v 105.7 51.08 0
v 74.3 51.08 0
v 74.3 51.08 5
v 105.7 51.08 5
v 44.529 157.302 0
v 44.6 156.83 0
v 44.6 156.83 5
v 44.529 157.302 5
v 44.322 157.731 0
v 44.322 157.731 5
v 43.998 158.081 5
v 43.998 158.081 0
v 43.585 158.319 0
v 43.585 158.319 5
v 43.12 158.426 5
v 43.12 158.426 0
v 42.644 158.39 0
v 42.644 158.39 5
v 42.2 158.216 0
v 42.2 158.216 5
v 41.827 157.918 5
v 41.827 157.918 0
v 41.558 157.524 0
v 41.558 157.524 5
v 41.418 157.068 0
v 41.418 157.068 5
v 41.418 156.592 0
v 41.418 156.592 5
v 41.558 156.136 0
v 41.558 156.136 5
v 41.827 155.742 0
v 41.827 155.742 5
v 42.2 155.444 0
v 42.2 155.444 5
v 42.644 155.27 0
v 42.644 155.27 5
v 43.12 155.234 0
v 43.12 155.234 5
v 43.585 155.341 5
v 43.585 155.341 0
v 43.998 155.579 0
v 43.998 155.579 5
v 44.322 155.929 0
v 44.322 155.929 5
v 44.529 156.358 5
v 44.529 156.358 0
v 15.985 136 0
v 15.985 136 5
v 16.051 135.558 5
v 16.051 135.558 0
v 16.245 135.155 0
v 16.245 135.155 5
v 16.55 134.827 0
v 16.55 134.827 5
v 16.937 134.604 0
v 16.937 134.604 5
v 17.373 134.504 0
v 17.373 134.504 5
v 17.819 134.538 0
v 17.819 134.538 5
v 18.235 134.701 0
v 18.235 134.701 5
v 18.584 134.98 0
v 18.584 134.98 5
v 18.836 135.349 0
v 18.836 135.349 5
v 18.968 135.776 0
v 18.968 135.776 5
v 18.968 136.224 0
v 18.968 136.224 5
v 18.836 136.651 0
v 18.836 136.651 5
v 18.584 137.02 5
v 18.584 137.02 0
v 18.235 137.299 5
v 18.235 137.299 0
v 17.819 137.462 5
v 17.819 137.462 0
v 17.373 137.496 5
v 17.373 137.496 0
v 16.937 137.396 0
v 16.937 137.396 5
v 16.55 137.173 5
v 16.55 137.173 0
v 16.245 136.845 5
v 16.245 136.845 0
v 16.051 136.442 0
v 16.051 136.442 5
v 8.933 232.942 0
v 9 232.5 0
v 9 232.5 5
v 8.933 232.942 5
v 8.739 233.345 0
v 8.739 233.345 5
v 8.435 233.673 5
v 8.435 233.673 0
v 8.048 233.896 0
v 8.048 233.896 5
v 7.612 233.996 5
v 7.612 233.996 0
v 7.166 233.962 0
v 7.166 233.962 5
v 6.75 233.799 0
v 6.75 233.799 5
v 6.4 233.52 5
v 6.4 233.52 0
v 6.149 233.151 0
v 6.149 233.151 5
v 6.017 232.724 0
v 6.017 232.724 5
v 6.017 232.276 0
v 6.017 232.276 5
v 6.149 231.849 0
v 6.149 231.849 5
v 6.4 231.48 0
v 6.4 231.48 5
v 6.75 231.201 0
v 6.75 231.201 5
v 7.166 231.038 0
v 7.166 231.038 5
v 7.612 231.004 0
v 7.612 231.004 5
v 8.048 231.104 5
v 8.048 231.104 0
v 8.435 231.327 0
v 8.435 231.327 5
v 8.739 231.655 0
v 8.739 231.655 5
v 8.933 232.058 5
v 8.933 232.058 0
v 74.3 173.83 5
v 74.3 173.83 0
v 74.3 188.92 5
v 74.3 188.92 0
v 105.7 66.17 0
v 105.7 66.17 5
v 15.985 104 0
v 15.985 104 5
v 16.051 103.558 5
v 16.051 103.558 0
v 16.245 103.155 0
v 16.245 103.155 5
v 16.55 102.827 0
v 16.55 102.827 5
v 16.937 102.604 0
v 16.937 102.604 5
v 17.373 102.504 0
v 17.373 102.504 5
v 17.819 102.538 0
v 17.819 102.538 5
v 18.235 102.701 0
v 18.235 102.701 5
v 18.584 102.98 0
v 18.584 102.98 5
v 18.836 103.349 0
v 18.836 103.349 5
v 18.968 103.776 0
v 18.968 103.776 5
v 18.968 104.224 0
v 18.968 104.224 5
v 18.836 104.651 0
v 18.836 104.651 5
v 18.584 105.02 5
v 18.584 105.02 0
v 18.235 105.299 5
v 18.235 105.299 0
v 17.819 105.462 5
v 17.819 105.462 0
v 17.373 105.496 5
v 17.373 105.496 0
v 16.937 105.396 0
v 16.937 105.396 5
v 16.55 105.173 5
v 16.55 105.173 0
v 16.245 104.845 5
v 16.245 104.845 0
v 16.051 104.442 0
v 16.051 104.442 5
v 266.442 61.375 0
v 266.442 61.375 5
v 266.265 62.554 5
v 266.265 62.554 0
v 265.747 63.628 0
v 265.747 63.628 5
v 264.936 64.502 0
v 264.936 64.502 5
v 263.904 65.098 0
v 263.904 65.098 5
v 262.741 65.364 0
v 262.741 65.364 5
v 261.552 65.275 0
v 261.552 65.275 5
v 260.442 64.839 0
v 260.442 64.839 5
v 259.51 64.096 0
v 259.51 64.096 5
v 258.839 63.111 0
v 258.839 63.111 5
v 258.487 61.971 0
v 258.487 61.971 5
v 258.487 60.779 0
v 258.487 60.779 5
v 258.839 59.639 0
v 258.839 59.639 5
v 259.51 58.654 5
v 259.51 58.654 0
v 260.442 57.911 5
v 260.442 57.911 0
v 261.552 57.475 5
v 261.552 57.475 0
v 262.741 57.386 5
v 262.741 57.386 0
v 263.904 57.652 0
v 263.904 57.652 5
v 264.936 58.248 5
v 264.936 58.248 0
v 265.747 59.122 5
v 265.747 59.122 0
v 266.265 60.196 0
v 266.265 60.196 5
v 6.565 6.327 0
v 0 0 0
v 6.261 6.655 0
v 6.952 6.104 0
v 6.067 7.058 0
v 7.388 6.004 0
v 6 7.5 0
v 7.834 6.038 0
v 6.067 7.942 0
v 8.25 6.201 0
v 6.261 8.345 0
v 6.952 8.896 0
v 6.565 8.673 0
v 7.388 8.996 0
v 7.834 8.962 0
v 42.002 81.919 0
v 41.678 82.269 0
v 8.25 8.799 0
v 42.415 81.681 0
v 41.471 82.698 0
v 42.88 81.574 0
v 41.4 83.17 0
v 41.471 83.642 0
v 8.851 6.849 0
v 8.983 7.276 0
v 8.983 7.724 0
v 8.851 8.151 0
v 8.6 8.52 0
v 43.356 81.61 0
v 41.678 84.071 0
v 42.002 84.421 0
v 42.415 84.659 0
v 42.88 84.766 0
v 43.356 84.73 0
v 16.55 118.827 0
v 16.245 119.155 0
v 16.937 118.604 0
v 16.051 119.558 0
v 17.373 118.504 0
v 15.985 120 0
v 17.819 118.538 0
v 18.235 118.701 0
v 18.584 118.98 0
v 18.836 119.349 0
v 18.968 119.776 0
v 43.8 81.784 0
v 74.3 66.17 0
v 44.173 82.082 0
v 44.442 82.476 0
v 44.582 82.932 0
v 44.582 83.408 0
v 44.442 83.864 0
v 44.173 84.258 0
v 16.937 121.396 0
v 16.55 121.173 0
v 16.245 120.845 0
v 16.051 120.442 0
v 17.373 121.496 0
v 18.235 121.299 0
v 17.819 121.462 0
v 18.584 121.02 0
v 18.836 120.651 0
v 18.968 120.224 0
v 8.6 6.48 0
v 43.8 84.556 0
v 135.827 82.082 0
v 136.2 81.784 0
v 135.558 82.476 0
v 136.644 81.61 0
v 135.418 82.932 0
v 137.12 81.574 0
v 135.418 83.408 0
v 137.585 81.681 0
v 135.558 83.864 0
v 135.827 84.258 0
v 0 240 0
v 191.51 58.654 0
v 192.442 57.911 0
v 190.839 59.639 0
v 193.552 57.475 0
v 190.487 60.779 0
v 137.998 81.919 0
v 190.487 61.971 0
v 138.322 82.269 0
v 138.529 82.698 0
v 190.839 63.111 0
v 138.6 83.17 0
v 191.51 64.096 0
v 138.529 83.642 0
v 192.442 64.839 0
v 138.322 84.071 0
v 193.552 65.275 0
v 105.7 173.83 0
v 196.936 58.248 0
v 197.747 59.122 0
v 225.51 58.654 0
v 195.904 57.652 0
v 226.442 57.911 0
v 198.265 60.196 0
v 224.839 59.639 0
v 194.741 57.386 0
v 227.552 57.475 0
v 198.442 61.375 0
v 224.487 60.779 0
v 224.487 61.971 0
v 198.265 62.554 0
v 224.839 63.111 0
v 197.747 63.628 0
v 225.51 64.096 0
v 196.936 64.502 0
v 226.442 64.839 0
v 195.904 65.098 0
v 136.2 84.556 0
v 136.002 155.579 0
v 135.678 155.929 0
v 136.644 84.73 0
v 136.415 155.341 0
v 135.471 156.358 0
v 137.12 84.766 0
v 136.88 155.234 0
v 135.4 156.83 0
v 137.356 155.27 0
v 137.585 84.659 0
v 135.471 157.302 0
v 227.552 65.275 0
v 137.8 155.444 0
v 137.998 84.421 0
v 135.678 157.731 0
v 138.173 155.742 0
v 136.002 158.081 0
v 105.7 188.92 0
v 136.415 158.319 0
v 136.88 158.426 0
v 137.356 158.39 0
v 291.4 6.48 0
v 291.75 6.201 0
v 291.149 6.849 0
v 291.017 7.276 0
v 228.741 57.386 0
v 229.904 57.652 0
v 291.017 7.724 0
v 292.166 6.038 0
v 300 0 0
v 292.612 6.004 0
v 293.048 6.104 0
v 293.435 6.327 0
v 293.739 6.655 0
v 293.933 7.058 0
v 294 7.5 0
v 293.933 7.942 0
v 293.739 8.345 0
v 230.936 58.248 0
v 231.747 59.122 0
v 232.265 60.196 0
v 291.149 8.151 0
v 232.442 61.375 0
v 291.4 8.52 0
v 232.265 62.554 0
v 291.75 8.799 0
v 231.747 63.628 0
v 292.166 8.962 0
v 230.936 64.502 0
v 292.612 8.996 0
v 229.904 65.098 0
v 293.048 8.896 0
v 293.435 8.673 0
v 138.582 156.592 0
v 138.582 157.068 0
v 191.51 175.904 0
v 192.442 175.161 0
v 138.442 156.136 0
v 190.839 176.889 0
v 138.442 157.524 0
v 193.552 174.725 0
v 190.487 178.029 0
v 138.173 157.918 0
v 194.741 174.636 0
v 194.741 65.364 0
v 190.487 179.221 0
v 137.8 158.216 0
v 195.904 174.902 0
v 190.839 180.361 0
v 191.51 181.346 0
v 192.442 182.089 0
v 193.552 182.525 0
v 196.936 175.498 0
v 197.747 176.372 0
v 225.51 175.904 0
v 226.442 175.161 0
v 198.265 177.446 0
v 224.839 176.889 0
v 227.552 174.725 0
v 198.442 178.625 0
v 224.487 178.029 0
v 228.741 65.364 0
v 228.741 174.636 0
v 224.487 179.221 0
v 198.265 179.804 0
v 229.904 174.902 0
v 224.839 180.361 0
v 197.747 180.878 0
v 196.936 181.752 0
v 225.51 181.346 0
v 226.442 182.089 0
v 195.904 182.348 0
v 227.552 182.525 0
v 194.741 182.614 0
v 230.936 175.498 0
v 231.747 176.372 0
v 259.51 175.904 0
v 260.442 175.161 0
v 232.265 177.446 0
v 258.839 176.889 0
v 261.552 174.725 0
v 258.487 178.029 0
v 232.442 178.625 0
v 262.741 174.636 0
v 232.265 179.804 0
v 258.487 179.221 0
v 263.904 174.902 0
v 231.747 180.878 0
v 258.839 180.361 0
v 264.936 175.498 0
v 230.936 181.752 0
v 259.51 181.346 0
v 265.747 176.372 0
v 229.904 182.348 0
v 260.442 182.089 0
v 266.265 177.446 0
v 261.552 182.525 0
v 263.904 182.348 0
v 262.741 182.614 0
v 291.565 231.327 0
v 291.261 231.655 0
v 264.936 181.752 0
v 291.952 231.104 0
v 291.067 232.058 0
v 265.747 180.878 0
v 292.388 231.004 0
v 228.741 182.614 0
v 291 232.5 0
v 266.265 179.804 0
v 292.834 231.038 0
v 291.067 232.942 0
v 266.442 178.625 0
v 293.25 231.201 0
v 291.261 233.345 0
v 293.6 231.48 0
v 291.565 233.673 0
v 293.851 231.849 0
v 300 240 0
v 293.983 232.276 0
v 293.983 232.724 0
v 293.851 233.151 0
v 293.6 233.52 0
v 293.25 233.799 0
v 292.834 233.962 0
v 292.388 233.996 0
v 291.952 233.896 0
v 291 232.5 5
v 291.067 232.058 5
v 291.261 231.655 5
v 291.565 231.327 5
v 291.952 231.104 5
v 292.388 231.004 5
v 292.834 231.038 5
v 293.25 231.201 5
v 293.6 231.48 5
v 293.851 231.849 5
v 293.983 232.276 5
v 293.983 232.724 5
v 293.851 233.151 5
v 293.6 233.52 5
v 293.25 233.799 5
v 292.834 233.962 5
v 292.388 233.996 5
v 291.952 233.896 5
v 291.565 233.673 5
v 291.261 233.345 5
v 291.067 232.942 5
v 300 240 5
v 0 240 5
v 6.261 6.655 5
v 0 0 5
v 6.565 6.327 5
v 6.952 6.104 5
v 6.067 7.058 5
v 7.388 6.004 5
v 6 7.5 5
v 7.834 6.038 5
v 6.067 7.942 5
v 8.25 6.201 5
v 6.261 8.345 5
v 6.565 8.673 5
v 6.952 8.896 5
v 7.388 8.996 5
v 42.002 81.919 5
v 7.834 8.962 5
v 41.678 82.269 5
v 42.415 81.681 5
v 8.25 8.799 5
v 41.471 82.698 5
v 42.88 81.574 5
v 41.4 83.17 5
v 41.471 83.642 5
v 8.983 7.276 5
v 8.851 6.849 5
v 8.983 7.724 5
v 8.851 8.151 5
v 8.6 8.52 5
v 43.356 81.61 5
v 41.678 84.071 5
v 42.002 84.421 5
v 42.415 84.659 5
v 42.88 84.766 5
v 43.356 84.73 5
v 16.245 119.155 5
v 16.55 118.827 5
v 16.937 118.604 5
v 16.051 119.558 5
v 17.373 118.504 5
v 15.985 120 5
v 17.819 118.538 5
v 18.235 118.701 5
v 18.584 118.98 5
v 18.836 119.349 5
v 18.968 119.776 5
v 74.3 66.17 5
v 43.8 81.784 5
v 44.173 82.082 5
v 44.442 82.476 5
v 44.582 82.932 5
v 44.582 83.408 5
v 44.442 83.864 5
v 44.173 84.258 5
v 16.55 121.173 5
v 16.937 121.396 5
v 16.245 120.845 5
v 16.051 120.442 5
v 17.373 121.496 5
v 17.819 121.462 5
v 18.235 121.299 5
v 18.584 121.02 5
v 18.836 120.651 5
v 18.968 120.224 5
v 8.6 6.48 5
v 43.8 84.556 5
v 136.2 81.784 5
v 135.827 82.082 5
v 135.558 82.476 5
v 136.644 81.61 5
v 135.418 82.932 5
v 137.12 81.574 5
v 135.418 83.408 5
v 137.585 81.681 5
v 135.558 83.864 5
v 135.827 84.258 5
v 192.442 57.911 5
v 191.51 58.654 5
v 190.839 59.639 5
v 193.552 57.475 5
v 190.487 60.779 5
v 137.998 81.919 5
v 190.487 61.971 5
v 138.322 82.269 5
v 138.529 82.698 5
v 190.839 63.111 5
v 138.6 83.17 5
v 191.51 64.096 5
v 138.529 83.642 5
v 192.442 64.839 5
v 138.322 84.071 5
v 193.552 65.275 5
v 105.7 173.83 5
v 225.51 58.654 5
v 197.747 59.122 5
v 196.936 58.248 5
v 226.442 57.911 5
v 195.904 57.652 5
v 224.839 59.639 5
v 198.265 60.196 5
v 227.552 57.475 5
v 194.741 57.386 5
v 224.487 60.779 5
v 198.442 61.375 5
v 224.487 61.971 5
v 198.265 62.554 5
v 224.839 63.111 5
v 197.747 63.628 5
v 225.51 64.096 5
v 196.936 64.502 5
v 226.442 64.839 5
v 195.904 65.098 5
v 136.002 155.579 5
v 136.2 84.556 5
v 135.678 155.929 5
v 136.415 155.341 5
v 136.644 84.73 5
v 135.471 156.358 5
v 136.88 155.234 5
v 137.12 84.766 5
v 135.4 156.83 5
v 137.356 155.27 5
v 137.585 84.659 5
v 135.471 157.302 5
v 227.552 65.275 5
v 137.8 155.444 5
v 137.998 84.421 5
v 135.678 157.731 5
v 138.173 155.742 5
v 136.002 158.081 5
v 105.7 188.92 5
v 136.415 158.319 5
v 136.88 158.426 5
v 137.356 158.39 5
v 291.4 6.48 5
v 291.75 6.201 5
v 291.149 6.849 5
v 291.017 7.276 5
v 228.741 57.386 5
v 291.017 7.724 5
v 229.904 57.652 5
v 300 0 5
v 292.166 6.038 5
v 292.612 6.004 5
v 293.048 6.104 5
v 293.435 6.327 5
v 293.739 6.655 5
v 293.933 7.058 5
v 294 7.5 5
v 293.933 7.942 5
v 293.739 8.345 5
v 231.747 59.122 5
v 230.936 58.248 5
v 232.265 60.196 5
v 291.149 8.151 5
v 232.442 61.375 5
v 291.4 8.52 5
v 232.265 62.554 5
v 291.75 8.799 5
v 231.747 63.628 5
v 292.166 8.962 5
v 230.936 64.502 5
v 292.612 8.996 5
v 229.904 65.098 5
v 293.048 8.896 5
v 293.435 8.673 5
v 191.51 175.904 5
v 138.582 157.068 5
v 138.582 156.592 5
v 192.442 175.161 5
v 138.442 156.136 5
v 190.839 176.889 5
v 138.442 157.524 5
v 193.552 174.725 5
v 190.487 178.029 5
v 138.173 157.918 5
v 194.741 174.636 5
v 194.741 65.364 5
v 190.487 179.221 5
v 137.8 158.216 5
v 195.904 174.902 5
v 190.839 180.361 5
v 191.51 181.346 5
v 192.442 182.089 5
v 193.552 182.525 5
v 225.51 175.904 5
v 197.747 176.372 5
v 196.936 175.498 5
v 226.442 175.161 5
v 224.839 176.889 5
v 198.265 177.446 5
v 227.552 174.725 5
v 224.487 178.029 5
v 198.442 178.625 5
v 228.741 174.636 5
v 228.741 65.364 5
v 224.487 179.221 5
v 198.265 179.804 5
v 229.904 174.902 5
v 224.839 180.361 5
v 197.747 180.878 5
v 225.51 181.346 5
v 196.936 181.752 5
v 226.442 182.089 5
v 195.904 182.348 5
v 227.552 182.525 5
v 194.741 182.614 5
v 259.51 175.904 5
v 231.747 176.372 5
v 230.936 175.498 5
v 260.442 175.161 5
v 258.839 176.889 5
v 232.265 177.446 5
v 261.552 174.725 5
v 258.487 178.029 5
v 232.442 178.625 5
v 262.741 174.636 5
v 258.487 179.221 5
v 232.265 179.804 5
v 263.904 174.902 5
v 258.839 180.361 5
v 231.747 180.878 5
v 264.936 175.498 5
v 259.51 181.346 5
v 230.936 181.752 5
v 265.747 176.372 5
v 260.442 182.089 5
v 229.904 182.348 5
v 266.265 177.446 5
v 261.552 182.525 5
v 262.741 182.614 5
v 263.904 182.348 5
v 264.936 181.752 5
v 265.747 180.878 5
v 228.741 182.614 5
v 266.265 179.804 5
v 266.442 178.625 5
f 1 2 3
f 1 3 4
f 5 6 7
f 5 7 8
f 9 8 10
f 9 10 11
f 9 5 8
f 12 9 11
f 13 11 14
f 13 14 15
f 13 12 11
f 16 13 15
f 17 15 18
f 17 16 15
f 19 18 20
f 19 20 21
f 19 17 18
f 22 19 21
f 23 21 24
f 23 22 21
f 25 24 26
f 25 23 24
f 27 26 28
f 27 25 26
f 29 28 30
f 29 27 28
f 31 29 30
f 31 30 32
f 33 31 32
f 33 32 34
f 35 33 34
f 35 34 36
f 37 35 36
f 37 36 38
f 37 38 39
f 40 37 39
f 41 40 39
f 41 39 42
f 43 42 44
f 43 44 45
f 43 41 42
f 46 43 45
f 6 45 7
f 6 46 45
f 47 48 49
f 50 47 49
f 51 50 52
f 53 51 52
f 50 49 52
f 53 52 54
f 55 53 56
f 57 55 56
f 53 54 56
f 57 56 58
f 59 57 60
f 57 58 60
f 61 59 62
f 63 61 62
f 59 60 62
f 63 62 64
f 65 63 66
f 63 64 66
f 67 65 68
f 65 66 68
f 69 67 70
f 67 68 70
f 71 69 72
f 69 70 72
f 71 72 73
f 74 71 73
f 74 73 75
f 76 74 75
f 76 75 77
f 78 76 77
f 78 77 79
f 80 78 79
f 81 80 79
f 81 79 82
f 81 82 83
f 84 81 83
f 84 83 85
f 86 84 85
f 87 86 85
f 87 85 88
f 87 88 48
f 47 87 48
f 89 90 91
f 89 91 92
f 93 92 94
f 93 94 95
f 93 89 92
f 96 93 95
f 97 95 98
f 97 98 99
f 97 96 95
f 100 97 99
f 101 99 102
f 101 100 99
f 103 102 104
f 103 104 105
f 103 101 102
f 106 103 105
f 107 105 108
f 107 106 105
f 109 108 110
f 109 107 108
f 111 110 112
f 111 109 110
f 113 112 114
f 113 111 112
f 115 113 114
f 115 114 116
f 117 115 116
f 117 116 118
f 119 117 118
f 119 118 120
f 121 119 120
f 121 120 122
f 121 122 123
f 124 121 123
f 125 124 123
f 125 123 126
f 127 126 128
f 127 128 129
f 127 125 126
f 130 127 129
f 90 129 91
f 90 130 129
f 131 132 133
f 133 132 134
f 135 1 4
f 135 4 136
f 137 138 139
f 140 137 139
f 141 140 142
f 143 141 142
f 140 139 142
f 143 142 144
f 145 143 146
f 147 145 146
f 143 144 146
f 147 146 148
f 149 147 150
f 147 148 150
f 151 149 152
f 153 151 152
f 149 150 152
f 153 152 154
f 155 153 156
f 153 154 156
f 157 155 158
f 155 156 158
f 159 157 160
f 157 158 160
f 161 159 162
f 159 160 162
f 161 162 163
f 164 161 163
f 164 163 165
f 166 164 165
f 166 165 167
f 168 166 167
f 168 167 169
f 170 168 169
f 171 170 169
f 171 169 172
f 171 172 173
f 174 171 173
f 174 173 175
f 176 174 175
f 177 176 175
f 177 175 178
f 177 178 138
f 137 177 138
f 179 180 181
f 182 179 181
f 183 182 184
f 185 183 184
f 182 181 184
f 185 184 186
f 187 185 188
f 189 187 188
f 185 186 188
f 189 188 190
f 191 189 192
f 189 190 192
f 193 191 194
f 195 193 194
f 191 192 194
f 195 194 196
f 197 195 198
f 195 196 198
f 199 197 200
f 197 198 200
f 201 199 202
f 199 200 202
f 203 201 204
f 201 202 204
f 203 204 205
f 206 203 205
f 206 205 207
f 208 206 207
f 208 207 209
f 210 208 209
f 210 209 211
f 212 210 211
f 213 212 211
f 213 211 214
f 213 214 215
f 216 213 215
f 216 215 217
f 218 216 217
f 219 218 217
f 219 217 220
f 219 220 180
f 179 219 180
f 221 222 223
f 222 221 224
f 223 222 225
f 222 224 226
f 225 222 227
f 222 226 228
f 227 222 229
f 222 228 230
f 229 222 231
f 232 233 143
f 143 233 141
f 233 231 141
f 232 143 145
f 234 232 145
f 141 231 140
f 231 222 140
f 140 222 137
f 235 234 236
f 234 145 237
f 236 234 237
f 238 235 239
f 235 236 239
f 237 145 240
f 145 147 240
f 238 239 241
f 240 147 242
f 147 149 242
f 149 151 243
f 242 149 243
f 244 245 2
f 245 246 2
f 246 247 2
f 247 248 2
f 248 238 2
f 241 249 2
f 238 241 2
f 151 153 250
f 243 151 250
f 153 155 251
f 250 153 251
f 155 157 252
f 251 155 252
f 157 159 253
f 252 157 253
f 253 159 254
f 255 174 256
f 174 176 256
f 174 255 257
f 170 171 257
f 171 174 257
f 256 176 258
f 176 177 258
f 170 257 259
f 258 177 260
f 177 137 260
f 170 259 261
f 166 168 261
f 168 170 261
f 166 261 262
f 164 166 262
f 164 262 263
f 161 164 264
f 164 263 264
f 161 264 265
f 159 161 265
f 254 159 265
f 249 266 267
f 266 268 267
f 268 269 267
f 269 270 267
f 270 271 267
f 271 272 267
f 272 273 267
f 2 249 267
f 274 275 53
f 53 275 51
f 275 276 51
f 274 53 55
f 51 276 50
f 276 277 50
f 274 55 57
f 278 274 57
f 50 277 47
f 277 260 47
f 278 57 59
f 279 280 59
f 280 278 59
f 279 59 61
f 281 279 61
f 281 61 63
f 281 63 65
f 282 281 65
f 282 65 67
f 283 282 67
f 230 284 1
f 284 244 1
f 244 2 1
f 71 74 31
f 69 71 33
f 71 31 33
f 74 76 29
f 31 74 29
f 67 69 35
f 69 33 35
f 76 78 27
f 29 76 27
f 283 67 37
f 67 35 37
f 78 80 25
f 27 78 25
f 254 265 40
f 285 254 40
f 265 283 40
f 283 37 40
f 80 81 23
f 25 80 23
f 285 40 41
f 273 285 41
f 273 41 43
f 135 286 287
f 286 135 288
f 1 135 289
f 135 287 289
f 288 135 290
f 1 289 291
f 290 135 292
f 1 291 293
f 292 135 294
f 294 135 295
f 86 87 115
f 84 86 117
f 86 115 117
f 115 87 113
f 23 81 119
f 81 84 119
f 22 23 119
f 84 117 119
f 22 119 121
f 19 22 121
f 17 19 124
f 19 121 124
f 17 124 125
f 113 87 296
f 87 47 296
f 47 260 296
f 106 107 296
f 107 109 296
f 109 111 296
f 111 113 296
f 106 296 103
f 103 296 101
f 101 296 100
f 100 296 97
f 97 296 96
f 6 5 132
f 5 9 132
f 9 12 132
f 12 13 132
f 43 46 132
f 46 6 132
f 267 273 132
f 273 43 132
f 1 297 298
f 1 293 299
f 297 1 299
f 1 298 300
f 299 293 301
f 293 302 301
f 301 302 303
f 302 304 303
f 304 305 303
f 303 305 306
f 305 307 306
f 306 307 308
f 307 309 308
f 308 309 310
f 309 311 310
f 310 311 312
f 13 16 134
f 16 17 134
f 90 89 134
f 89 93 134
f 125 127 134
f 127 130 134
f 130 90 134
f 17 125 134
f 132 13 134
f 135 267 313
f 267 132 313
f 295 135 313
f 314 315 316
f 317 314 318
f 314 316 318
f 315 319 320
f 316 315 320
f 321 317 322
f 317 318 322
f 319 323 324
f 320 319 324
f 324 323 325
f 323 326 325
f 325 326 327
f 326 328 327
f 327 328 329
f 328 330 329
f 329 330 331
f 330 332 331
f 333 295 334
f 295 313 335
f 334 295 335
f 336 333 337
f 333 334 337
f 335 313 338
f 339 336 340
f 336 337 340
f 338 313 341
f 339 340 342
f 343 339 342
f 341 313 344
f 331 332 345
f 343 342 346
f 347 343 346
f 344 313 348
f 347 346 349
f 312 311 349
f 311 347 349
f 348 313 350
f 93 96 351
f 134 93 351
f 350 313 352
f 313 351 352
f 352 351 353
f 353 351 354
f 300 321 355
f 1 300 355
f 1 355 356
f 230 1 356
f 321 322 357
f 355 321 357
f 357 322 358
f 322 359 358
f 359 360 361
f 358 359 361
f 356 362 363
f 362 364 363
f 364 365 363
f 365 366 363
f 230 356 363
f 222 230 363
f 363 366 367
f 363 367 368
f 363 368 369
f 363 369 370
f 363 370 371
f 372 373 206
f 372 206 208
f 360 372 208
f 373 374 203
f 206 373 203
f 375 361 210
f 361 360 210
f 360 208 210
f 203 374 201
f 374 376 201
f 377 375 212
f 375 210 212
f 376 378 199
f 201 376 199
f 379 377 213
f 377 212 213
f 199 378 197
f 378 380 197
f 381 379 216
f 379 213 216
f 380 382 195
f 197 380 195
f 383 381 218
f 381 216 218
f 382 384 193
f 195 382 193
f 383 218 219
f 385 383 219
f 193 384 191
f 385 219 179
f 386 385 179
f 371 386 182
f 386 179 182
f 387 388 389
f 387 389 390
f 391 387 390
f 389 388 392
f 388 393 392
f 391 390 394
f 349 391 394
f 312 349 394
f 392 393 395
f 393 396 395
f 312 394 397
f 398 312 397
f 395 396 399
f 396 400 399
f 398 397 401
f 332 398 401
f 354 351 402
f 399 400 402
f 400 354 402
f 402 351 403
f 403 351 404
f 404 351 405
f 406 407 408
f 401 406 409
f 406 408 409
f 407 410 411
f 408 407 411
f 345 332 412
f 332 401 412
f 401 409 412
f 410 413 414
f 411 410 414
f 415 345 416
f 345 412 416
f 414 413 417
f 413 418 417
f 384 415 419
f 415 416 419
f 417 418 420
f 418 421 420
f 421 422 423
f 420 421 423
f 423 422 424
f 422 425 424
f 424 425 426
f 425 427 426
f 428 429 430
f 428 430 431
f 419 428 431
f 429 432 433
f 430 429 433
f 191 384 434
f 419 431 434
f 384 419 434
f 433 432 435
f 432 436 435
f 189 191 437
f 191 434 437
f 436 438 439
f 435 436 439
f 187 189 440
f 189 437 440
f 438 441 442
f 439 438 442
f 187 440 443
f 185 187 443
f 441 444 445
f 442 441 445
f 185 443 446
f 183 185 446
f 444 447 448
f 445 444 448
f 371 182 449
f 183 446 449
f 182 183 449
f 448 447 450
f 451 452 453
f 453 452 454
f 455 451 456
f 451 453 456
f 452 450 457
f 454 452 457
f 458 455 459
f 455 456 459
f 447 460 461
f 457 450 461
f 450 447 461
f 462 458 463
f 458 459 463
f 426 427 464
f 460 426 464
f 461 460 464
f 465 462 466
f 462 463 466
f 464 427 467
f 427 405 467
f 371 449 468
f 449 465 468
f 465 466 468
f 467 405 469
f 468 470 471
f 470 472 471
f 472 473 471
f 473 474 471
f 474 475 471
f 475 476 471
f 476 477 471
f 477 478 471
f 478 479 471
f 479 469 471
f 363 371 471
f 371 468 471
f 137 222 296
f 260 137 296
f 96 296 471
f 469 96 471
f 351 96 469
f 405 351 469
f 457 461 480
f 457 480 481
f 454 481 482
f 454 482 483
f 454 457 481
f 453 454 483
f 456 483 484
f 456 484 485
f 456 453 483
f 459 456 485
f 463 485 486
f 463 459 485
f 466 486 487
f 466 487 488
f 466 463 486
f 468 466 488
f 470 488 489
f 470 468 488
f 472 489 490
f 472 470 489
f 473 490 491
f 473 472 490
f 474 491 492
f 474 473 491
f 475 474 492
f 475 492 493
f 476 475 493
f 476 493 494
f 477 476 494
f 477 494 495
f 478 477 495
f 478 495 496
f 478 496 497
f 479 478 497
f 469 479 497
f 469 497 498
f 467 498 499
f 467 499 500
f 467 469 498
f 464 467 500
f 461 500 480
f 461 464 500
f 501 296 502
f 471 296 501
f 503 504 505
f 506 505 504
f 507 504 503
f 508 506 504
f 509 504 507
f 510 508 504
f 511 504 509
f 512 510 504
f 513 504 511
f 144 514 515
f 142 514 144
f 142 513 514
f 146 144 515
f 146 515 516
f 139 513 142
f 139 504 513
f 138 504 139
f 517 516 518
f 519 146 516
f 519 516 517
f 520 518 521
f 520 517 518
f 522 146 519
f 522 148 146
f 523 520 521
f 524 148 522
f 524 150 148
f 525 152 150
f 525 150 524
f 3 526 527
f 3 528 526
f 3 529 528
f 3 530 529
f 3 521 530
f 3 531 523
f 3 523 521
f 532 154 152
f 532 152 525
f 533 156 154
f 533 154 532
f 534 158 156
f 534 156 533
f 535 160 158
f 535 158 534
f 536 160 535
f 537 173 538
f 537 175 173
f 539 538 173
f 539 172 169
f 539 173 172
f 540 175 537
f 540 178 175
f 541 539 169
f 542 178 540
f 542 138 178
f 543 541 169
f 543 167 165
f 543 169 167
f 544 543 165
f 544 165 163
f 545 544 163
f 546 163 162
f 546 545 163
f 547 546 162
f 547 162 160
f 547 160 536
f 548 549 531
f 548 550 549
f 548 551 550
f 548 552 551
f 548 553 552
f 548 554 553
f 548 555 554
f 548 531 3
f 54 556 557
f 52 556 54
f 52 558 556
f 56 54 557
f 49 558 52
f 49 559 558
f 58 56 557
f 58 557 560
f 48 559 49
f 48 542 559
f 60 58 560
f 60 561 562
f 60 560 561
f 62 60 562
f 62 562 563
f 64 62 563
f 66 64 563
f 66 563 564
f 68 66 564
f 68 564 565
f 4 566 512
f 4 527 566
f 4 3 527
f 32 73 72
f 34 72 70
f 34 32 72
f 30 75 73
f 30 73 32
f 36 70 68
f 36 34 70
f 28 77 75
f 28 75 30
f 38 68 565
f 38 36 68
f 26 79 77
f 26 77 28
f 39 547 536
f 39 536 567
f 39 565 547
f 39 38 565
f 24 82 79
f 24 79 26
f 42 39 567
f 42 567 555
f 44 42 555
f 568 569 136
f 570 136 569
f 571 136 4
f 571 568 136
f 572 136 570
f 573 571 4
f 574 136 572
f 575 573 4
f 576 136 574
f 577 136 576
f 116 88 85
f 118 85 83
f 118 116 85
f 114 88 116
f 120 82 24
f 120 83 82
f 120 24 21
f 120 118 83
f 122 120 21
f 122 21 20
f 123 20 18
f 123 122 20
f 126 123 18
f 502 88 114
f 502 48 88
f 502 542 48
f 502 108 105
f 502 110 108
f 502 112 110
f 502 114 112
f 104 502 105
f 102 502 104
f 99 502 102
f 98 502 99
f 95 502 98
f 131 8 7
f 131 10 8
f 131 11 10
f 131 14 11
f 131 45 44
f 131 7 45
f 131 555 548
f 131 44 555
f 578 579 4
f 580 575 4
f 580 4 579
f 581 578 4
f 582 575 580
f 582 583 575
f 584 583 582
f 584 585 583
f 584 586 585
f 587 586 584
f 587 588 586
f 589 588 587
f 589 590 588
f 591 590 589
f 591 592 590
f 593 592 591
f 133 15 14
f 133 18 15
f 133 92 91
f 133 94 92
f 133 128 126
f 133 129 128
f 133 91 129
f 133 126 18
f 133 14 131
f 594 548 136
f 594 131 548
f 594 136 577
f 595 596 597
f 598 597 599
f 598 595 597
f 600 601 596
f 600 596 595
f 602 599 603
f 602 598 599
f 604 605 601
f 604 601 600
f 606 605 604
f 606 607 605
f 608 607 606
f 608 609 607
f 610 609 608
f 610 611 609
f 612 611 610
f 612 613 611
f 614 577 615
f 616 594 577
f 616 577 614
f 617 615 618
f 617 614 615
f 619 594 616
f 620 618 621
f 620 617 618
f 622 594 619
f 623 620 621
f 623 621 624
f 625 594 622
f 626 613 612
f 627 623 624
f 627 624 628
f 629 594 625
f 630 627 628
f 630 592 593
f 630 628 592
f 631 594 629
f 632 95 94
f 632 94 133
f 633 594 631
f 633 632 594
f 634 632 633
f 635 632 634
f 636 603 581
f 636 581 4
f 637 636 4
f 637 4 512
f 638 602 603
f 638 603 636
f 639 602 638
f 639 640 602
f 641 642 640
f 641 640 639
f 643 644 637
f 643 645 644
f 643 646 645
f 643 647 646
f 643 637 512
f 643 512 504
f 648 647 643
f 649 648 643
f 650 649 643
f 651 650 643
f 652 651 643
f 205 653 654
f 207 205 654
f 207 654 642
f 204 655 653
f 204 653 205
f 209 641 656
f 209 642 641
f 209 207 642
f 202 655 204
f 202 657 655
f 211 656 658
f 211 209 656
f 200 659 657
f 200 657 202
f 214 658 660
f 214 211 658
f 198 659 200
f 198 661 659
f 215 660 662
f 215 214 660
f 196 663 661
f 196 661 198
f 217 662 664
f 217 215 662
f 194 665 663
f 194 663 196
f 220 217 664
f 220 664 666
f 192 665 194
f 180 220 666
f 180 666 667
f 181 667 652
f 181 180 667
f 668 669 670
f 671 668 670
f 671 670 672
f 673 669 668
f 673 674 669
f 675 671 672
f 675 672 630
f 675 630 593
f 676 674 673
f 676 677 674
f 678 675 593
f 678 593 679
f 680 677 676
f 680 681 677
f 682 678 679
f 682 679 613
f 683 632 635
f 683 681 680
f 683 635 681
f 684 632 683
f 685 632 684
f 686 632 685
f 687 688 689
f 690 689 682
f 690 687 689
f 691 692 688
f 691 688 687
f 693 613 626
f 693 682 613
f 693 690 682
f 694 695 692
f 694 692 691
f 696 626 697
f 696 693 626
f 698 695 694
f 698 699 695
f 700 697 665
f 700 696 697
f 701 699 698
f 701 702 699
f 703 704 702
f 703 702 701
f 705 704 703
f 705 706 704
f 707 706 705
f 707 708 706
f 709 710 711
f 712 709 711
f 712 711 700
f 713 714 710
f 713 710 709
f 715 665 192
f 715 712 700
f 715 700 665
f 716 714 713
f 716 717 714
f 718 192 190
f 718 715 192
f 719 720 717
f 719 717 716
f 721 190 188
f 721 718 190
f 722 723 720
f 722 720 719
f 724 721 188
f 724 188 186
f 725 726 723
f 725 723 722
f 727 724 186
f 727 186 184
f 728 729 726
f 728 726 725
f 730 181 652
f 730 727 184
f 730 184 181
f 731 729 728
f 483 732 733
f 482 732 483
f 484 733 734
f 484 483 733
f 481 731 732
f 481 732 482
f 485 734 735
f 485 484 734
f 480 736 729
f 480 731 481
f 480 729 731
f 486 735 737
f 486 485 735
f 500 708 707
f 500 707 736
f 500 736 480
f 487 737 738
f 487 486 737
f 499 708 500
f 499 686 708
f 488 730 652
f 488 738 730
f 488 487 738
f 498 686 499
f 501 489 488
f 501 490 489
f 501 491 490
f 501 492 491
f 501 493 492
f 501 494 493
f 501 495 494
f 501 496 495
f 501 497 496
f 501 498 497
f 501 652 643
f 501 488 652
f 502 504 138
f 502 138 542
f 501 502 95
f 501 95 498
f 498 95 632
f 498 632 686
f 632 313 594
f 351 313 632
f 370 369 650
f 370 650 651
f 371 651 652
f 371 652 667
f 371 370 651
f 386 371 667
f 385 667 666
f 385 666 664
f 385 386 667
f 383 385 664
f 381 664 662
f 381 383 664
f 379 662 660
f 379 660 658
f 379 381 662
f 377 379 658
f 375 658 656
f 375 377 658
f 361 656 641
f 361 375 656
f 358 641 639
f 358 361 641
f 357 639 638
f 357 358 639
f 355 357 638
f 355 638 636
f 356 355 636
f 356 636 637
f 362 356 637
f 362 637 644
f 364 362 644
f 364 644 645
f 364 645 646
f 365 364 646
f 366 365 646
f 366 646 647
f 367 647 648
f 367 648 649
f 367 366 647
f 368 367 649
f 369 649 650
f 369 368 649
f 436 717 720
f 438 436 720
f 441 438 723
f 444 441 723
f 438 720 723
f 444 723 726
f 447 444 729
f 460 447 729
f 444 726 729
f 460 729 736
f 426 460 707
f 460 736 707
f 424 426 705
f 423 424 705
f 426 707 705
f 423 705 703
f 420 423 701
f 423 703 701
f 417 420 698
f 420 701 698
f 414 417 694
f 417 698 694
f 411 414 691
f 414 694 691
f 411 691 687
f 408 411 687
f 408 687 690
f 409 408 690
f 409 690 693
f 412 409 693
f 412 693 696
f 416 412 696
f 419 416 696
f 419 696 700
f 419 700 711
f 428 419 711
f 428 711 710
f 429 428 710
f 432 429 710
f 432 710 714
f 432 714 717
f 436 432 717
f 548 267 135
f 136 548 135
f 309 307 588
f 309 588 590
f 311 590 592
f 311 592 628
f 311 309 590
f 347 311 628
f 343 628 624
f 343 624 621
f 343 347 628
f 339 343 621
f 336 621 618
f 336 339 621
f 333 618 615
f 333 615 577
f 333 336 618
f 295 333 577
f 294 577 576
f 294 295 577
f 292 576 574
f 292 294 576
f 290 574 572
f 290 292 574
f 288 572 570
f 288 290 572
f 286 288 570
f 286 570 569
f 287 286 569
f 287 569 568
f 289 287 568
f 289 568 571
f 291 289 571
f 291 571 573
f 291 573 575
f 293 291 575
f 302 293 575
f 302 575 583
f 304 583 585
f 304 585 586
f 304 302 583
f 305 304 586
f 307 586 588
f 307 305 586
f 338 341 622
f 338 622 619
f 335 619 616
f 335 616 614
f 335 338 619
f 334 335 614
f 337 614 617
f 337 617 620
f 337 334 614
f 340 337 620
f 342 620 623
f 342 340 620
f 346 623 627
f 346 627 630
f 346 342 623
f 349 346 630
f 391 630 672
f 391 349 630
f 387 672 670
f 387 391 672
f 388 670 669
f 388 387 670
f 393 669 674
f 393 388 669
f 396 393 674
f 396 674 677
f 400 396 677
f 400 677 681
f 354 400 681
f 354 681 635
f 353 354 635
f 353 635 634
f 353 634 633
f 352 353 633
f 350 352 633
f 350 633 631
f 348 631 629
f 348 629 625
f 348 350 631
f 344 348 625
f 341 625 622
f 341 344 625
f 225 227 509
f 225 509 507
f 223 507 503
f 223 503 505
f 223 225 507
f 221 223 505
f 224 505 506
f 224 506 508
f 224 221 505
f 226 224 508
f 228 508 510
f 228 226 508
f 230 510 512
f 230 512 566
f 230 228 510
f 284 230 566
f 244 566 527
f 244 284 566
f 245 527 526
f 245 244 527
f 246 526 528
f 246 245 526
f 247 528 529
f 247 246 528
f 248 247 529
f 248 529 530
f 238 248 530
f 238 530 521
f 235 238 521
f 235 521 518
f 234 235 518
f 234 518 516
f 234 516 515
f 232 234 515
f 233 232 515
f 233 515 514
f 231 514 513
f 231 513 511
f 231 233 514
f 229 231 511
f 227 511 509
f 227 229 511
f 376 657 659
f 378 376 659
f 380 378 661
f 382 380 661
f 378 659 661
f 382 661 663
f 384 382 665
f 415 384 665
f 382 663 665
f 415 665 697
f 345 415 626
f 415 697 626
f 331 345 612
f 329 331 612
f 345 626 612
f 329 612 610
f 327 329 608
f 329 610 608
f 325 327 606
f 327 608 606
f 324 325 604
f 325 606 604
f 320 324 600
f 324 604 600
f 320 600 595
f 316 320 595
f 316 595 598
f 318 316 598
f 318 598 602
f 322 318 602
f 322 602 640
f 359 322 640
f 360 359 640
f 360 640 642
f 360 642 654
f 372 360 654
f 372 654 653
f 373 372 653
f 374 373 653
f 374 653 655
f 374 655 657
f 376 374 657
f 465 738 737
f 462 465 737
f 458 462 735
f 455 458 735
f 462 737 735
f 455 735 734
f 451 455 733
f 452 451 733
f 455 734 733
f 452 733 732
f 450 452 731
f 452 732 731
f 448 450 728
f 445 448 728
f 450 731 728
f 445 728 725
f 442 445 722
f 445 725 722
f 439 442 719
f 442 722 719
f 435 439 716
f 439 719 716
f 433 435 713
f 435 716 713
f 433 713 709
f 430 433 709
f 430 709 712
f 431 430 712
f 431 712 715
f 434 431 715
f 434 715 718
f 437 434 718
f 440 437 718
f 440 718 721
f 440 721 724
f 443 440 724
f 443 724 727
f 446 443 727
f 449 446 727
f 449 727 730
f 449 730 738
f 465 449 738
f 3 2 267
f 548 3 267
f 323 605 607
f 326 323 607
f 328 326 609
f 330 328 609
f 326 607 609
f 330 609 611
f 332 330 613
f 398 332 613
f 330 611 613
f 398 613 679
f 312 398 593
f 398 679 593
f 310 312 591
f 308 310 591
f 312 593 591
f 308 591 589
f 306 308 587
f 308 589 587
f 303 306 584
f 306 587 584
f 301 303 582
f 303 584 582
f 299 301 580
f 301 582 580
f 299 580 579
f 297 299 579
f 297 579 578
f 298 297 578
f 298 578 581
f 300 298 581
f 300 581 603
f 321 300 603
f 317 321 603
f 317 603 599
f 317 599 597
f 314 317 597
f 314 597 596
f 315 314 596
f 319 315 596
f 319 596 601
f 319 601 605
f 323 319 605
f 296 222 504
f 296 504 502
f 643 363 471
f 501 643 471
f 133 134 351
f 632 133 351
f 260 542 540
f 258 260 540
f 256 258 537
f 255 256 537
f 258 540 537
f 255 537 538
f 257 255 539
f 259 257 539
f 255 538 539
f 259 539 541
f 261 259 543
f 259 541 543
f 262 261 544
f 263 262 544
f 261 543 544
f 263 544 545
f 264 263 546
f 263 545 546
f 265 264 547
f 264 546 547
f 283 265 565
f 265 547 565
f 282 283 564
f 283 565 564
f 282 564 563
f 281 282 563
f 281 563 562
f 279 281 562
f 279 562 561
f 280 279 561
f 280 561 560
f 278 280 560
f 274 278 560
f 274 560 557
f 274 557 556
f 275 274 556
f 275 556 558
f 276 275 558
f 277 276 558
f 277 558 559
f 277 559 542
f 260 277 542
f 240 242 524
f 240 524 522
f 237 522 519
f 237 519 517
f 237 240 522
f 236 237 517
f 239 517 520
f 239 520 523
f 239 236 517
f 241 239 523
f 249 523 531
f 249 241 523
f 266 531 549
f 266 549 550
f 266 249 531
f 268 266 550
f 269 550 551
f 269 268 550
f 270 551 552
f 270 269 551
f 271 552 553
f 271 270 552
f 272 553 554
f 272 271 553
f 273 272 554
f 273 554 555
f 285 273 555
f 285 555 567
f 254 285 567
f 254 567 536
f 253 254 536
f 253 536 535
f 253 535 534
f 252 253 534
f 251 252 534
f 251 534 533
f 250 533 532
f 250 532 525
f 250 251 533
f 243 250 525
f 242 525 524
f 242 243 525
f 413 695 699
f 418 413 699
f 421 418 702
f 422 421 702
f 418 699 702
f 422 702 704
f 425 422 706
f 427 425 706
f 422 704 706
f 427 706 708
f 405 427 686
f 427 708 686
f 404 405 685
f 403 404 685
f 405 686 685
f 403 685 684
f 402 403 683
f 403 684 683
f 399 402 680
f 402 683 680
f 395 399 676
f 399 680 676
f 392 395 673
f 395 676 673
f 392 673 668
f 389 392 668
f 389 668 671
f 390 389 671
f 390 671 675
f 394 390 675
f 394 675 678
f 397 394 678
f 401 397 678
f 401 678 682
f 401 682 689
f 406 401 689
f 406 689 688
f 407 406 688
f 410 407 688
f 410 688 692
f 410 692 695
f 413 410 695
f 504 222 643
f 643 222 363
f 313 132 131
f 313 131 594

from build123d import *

# Parameters (mm, degrees)
SKETCH1_W           = 300
SKETCH1_H           = 240
SKETCH1_R           = 1.5
SKETCH1_R_2         = 1.6
SKETCH1_W_2         = 31.4
SKETCH1_H_2         = 15.09
BOSS_EXTRUDE1_DEPTH = 5
SKETCH3_R           = 1.5
CUT_EXTRUDE1_DEPTH  = 385.219989069
SKETCH5_R           = 4
CUT_EXTRUDE3_DEPTH  = 385.219989069
SKETCH8_R           = 4
CUT_EXTRUDE4_DEPTH  = 385.219989069


with BuildPart() as part:
    # Sketch1 → Boss-Extrude1 (new body)
    with BuildSketch(Plane.XY):
        with Locations((150, 120)):
            Rectangle(SKETCH1_W, SKETCH1_H)
        with Locations((7.5, 232.5)):
            Circle(SKETCH1_R, mode=Mode.SUBTRACT)
        with Locations(Location((292.5, 232.5, 0), (0, 0, 180))):
            Circle(SKETCH1_R, mode=Mode.SUBTRACT)
        with Locations((292.5, 7.5)):
            Circle(SKETCH1_R, mode=Mode.SUBTRACT)
        with Locations(Location((7.5, 7.5, 0), (0, 0, 180))):
            Circle(SKETCH1_R, mode=Mode.SUBTRACT)
        with Locations(Location((137, 156.83, 0), (0, 0, 180))):
            Circle(SKETCH1_R_2, mode=Mode.SUBTRACT)
        with Locations((43, 156.83)):
            Circle(SKETCH1_R_2, mode=Mode.SUBTRACT)
        with Locations(Location((43, 83.17, 0), (0, 0, 180))):
            Circle(SKETCH1_R_2, mode=Mode.SUBTRACT)
        with Locations((137, 83.17)):
            Circle(SKETCH1_R_2, mode=Mode.SUBTRACT)
        with Locations((90, 181.375)):
            Rectangle(SKETCH1_W_2, SKETCH1_H_2, mode=Mode.SUBTRACT)
        with Locations((90, 58.625)):
            Rectangle(SKETCH1_W_2, SKETCH1_H_2, mode=Mode.SUBTRACT)
    extrude(amount=BOSS_EXTRUDE1_DEPTH)

    # Sketch3 → Cut-Extrude1 (cut, through all)
    with BuildSketch(Plane.XY.offset(5)):
        with Locations(Location((17.484796486, 136, 0), (0, 0, 180))):
            Circle(SKETCH3_R)
        with Locations(Location((17.484796486, 120, 0), (0, 0, 180))):
            Circle(SKETCH3_R)
        with Locations(Location((17.484796486, 104, 0), (0, 0, 180))):
            Circle(SKETCH3_R)
    extrude(amount=-CUT_EXTRUDE1_DEPTH, mode=Mode.SUBTRACT)

    # Sketch5 → Cut-Extrude3 (cut, through all)
    with BuildSketch(Plane.XY.offset(5)):
        with Locations((194.442432224, 178.625000137)):
            Circle(SKETCH5_R)
        with Locations((228.442432224, 178.625000137)):
            Circle(SKETCH5_R)
        with Locations((262.442432224, 178.625000137)):
            Circle(SKETCH5_R)
    extrude(amount=-CUT_EXTRUDE3_DEPTH, mode=Mode.SUBTRACT)

    # Sketch8 → Cut-Extrude4 (cut, through all)
    with BuildSketch(Plane.XY.offset(5)):
        with Locations((194.442432224, 61.375000137)):
            Circle(SKETCH8_R)
        with Locations((228.442432224, 61.375000137)):
            Circle(SKETCH8_R)
        with Locations((262.442432224, 61.375000137)):
            Circle(SKETCH8_R)
    extrude(amount=-CUT_EXTRUDE4_DEPTH, mode=Mode.SUBTRACT)


solid = part.part
